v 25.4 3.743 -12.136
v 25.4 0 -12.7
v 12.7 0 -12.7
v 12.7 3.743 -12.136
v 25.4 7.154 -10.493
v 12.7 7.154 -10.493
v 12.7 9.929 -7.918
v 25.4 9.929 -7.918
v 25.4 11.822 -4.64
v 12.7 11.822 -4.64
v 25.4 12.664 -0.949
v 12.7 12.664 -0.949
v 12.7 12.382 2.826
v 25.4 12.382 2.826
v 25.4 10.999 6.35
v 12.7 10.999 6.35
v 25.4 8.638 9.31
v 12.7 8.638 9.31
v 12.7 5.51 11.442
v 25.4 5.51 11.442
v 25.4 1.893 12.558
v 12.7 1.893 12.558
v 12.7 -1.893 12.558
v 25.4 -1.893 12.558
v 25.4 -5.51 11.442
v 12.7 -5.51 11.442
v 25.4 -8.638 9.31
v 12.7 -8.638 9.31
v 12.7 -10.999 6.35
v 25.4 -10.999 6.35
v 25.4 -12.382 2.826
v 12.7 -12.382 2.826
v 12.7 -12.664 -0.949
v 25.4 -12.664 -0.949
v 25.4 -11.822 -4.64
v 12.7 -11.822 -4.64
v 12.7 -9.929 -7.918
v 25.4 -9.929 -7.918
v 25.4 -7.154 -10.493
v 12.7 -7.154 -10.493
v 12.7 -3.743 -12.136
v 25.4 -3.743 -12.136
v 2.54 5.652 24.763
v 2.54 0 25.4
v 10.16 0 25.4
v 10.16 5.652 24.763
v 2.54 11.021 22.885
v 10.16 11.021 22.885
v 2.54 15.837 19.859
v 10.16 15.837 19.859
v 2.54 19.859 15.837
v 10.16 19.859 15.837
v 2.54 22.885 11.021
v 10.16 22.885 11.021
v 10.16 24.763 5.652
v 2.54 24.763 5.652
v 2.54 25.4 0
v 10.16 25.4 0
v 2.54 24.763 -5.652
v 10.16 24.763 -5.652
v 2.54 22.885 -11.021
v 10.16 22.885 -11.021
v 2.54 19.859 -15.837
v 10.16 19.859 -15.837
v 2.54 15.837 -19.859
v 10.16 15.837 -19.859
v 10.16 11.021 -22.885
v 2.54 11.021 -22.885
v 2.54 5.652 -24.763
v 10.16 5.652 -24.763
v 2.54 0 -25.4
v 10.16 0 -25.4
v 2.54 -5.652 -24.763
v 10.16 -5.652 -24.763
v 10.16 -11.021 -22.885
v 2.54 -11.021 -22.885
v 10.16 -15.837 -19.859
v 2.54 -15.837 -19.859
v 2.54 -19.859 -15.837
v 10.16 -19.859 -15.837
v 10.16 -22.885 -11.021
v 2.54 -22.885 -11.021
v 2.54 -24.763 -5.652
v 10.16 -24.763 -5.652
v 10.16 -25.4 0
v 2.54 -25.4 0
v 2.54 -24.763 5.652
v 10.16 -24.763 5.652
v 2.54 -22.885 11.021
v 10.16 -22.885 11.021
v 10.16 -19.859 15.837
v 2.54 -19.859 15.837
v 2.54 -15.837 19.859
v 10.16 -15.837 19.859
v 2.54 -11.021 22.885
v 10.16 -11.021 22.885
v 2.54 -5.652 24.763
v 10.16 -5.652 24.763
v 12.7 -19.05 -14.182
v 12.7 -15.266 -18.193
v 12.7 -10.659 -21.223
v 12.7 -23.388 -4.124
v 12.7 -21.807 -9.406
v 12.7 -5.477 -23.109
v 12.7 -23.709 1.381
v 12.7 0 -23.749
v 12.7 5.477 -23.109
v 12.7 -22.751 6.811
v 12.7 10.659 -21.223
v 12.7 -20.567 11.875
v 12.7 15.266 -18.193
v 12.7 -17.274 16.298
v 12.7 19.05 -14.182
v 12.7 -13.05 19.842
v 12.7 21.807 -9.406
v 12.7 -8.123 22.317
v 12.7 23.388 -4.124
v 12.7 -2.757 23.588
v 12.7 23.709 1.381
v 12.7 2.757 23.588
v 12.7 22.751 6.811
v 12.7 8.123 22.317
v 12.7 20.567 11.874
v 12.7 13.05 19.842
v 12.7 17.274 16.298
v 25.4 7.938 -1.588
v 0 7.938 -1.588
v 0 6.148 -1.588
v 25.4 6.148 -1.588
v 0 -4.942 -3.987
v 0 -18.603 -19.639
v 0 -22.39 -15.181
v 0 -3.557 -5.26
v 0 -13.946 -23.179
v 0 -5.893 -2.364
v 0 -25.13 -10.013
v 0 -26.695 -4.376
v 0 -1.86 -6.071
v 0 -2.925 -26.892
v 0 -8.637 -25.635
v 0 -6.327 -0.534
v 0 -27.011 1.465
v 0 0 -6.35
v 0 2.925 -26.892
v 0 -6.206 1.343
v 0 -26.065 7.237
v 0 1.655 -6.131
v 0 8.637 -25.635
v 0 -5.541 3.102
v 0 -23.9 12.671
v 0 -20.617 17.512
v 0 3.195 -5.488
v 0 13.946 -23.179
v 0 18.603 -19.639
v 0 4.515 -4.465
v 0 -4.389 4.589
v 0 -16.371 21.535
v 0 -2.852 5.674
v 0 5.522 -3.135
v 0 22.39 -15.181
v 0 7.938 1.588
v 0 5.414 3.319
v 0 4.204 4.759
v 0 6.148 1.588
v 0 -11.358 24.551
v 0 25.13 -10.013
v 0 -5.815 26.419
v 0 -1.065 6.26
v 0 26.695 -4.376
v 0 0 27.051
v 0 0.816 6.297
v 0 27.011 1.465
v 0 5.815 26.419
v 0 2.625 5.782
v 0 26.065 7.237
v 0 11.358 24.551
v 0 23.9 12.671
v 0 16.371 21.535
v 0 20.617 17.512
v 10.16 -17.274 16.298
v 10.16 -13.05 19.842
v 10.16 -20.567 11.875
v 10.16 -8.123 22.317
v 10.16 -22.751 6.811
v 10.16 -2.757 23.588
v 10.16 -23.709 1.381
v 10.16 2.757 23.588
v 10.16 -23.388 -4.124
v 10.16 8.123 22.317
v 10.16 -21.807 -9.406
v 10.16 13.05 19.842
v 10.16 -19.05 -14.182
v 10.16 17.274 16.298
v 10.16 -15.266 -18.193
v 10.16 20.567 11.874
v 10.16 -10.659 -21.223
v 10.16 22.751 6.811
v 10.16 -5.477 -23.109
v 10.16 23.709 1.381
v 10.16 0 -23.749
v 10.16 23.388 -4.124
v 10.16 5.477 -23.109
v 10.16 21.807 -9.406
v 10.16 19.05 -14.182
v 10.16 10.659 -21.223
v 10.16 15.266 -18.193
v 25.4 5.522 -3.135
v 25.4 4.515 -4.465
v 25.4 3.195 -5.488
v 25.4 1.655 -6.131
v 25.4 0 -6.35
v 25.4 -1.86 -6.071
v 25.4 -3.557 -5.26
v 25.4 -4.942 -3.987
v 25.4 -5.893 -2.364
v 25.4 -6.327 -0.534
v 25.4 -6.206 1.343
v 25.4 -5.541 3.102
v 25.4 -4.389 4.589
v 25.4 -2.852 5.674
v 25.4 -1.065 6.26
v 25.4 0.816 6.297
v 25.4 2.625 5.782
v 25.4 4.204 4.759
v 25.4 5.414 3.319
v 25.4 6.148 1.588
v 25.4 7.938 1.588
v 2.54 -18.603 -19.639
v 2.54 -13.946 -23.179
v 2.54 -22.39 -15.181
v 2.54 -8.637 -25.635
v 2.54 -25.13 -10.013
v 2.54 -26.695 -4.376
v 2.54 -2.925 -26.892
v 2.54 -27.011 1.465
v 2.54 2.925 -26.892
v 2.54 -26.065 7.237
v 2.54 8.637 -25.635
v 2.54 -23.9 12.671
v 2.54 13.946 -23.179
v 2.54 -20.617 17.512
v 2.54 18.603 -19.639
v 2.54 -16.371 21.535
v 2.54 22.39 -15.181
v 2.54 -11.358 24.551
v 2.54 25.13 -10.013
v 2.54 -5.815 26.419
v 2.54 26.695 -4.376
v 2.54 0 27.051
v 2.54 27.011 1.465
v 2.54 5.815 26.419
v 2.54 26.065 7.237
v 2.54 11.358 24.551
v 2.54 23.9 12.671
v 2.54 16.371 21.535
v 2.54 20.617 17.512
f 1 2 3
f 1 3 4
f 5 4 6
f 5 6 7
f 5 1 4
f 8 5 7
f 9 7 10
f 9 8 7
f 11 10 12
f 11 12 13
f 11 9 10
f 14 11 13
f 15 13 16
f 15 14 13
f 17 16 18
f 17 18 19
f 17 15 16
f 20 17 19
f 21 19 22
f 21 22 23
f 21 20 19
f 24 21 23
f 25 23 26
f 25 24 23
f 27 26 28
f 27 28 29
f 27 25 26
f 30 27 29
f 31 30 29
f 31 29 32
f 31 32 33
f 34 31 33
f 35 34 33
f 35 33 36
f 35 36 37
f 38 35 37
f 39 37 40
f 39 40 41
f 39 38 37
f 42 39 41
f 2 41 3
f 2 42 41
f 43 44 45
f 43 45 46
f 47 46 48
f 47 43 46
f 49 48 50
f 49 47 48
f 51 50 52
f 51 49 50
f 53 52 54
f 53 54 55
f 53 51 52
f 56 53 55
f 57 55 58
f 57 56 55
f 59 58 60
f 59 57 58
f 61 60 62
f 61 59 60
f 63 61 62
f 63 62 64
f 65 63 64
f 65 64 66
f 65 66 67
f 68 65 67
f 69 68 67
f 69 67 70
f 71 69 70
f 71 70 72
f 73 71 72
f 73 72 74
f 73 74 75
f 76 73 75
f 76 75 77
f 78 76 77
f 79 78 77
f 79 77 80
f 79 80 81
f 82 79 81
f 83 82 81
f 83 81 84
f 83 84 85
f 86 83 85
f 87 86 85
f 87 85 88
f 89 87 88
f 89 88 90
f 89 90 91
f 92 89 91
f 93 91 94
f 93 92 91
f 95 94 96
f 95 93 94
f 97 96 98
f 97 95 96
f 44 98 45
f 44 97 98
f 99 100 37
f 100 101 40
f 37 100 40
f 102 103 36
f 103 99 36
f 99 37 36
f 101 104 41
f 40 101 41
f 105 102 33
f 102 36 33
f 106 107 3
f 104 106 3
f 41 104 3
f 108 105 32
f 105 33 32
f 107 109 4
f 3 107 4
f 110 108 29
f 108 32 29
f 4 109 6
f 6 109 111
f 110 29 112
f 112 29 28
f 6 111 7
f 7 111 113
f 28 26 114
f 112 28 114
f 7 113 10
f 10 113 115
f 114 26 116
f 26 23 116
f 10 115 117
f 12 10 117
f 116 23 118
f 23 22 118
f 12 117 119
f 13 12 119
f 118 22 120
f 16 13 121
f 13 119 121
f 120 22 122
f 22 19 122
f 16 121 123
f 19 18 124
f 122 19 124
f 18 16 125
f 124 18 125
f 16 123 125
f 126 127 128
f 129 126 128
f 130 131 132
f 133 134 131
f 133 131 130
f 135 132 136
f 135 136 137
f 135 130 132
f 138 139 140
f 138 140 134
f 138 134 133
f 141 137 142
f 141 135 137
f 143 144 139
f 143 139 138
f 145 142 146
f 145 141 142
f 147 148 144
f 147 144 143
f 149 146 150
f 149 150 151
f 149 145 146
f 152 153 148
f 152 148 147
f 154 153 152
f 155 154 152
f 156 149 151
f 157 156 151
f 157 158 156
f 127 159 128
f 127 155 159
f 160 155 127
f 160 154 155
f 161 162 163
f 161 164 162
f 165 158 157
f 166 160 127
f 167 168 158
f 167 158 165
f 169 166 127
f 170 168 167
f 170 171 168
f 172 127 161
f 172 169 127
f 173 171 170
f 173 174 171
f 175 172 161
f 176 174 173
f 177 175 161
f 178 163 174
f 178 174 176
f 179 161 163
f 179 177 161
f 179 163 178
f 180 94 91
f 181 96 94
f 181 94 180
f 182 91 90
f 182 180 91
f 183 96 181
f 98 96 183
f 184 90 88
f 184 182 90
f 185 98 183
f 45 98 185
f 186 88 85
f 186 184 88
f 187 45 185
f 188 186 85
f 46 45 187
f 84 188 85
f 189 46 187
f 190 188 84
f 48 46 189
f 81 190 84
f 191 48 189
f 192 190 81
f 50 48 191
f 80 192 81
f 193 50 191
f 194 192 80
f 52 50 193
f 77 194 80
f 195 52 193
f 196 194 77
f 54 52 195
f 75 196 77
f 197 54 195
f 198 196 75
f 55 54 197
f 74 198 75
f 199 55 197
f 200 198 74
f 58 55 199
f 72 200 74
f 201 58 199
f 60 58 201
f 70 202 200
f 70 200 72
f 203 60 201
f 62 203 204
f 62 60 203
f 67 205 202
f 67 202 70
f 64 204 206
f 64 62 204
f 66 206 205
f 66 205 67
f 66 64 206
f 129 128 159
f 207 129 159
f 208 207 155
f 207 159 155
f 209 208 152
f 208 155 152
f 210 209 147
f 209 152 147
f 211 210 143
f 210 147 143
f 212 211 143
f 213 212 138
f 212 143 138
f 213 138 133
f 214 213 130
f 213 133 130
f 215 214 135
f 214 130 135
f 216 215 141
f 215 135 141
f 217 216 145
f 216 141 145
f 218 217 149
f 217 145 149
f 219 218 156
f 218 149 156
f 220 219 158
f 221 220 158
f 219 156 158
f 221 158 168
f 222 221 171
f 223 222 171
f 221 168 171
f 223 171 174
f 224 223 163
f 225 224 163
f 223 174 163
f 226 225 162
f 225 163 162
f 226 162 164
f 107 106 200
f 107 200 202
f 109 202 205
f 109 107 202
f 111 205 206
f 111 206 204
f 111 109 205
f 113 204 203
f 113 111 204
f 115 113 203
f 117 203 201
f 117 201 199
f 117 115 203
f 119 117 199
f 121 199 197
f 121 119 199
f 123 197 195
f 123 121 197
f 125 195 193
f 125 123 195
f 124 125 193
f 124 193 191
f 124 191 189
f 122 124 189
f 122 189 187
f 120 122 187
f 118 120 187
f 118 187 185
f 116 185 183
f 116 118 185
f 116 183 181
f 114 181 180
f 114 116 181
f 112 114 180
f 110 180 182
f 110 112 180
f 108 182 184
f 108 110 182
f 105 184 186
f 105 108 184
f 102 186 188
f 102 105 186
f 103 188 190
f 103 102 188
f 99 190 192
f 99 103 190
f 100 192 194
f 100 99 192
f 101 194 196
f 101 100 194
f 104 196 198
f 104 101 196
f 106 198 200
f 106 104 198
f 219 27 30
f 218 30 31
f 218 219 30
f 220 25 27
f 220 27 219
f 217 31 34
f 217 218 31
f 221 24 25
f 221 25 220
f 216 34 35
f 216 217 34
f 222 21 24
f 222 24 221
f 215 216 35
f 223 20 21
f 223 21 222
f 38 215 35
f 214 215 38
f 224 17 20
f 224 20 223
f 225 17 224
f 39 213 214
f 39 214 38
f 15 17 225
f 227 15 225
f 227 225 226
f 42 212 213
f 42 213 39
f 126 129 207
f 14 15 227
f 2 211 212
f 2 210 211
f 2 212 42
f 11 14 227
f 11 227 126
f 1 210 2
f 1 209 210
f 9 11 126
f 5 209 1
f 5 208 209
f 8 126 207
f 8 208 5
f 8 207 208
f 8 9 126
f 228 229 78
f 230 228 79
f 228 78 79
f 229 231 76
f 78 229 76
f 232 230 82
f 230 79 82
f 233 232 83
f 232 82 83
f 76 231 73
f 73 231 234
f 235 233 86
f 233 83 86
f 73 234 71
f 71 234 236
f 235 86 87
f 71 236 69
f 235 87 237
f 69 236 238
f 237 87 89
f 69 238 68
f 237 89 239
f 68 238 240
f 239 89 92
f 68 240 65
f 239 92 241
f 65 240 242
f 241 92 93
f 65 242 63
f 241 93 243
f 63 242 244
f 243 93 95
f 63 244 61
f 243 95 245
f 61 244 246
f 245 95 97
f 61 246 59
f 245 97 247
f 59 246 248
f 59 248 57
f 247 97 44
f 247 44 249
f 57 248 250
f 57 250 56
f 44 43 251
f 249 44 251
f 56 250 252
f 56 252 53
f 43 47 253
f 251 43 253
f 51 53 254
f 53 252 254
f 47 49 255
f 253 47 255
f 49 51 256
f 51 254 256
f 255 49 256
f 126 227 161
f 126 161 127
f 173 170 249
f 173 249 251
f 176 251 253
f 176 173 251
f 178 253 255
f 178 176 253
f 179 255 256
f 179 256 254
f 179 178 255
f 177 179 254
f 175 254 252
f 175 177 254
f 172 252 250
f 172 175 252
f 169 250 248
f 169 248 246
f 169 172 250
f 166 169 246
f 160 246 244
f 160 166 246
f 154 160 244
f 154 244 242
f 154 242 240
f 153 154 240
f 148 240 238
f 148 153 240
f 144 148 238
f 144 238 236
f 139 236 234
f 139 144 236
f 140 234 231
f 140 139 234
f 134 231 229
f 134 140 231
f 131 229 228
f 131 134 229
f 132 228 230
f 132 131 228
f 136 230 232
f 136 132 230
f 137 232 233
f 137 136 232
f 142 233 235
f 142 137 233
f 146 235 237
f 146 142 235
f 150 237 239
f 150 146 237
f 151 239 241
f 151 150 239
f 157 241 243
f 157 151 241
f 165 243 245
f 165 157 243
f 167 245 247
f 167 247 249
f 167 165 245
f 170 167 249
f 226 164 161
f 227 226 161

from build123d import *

# Parameters (mm, degrees)
SKETCH1_R           = 22.225
BOSS_EXTRUDE1_DEPTH = 25.4
SKETCH2_R           = 25.4
SKETCH2_R_2         = 10.9140625
BOSS_EXTRUDE2_DEPTH = 12.7
SKETCH3_R           = 25.4
SKETCH3_R_2         = 12.7
CUT_EXTRUDE1_DEPTH  = 12.7
SKETCH5_R           = 27.051
SKETCH5_R_2         = 25.4
BOSS_EXTRUDE3_DEPTH = 2.54
SKETCH6_R           = 25.4
SKETCH6_R_2         = 23.749
CUT_EXTRUDE3_DEPTH  = 2.54


with BuildPart() as part:
    # Sketch1 → Boss-Extrude1 (new body)
    with BuildSketch(Plane(origin=(0, 0, 0), x_dir=(0, 0, -1), z_dir=(1, 0, 0))):
        Circle(SKETCH1_R)
        with BuildLine():
            Line((-1.5875, 6.148361062), (-1.5875, 7.9375))
            Line((-1.5875, 7.9375), (1.5875, 7.9375))
            Line((1.5875, 7.9375), (1.5875, 6.148361062))
            ThreePointArc((1.5875, 6.148361062), (5.020115786, 3.888564967), (6.35, 0))
            ThreePointArc((6.35, 0), (-3.888564967, -5.020115786), (-1.5875, 6.148361062))
        make_face(mode=Mode.SUBTRACT)
    extrude(amount=BOSS_EXTRUDE1_DEPTH)

    # Sketch2 → Boss-Extrude2 (add)
    with BuildSketch(Plane.ZY):
        Circle(SKETCH2_R)
        Circle(SKETCH2_R_2, mode=Mode.SUBTRACT)
    extrude(amount=-BOSS_EXTRUDE2_DEPTH)

    # Sketch3 → Cut-Extrude1 (cut)
    with BuildSketch(Plane(origin=(25.4, 0, 0), x_dir=(0, 0, -1), z_dir=(1, 0, 0))):
        Circle(SKETCH3_R)
        Circle(SKETCH3_R_2, mode=Mode.SUBTRACT)
    extrude(amount=-CUT_EXTRUDE1_DEPTH, mode=Mode.SUBTRACT)

    # Sketch5 → Boss-Extrude3 (add)
    with BuildSketch(Plane.ZY):
        Circle(SKETCH5_R)
        Circle(SKETCH5_R_2, mode=Mode.SUBTRACT)
    extrude(amount=-BOSS_EXTRUDE3_DEPTH)

    # Sketch6 → Cut-Extrude3 (cut)
    with BuildSketch(Plane(origin=(12.7, 0, 0), x_dir=(0, 0, -1), z_dir=(1, 0, 0))):
        Circle(SKETCH6_R)
        Circle(SKETCH6_R_2, mode=Mode.SUBTRACT)
    extrude(amount=-CUT_EXTRUDE3_DEPTH, mode=Mode.SUBTRACT)


solid = part.part
